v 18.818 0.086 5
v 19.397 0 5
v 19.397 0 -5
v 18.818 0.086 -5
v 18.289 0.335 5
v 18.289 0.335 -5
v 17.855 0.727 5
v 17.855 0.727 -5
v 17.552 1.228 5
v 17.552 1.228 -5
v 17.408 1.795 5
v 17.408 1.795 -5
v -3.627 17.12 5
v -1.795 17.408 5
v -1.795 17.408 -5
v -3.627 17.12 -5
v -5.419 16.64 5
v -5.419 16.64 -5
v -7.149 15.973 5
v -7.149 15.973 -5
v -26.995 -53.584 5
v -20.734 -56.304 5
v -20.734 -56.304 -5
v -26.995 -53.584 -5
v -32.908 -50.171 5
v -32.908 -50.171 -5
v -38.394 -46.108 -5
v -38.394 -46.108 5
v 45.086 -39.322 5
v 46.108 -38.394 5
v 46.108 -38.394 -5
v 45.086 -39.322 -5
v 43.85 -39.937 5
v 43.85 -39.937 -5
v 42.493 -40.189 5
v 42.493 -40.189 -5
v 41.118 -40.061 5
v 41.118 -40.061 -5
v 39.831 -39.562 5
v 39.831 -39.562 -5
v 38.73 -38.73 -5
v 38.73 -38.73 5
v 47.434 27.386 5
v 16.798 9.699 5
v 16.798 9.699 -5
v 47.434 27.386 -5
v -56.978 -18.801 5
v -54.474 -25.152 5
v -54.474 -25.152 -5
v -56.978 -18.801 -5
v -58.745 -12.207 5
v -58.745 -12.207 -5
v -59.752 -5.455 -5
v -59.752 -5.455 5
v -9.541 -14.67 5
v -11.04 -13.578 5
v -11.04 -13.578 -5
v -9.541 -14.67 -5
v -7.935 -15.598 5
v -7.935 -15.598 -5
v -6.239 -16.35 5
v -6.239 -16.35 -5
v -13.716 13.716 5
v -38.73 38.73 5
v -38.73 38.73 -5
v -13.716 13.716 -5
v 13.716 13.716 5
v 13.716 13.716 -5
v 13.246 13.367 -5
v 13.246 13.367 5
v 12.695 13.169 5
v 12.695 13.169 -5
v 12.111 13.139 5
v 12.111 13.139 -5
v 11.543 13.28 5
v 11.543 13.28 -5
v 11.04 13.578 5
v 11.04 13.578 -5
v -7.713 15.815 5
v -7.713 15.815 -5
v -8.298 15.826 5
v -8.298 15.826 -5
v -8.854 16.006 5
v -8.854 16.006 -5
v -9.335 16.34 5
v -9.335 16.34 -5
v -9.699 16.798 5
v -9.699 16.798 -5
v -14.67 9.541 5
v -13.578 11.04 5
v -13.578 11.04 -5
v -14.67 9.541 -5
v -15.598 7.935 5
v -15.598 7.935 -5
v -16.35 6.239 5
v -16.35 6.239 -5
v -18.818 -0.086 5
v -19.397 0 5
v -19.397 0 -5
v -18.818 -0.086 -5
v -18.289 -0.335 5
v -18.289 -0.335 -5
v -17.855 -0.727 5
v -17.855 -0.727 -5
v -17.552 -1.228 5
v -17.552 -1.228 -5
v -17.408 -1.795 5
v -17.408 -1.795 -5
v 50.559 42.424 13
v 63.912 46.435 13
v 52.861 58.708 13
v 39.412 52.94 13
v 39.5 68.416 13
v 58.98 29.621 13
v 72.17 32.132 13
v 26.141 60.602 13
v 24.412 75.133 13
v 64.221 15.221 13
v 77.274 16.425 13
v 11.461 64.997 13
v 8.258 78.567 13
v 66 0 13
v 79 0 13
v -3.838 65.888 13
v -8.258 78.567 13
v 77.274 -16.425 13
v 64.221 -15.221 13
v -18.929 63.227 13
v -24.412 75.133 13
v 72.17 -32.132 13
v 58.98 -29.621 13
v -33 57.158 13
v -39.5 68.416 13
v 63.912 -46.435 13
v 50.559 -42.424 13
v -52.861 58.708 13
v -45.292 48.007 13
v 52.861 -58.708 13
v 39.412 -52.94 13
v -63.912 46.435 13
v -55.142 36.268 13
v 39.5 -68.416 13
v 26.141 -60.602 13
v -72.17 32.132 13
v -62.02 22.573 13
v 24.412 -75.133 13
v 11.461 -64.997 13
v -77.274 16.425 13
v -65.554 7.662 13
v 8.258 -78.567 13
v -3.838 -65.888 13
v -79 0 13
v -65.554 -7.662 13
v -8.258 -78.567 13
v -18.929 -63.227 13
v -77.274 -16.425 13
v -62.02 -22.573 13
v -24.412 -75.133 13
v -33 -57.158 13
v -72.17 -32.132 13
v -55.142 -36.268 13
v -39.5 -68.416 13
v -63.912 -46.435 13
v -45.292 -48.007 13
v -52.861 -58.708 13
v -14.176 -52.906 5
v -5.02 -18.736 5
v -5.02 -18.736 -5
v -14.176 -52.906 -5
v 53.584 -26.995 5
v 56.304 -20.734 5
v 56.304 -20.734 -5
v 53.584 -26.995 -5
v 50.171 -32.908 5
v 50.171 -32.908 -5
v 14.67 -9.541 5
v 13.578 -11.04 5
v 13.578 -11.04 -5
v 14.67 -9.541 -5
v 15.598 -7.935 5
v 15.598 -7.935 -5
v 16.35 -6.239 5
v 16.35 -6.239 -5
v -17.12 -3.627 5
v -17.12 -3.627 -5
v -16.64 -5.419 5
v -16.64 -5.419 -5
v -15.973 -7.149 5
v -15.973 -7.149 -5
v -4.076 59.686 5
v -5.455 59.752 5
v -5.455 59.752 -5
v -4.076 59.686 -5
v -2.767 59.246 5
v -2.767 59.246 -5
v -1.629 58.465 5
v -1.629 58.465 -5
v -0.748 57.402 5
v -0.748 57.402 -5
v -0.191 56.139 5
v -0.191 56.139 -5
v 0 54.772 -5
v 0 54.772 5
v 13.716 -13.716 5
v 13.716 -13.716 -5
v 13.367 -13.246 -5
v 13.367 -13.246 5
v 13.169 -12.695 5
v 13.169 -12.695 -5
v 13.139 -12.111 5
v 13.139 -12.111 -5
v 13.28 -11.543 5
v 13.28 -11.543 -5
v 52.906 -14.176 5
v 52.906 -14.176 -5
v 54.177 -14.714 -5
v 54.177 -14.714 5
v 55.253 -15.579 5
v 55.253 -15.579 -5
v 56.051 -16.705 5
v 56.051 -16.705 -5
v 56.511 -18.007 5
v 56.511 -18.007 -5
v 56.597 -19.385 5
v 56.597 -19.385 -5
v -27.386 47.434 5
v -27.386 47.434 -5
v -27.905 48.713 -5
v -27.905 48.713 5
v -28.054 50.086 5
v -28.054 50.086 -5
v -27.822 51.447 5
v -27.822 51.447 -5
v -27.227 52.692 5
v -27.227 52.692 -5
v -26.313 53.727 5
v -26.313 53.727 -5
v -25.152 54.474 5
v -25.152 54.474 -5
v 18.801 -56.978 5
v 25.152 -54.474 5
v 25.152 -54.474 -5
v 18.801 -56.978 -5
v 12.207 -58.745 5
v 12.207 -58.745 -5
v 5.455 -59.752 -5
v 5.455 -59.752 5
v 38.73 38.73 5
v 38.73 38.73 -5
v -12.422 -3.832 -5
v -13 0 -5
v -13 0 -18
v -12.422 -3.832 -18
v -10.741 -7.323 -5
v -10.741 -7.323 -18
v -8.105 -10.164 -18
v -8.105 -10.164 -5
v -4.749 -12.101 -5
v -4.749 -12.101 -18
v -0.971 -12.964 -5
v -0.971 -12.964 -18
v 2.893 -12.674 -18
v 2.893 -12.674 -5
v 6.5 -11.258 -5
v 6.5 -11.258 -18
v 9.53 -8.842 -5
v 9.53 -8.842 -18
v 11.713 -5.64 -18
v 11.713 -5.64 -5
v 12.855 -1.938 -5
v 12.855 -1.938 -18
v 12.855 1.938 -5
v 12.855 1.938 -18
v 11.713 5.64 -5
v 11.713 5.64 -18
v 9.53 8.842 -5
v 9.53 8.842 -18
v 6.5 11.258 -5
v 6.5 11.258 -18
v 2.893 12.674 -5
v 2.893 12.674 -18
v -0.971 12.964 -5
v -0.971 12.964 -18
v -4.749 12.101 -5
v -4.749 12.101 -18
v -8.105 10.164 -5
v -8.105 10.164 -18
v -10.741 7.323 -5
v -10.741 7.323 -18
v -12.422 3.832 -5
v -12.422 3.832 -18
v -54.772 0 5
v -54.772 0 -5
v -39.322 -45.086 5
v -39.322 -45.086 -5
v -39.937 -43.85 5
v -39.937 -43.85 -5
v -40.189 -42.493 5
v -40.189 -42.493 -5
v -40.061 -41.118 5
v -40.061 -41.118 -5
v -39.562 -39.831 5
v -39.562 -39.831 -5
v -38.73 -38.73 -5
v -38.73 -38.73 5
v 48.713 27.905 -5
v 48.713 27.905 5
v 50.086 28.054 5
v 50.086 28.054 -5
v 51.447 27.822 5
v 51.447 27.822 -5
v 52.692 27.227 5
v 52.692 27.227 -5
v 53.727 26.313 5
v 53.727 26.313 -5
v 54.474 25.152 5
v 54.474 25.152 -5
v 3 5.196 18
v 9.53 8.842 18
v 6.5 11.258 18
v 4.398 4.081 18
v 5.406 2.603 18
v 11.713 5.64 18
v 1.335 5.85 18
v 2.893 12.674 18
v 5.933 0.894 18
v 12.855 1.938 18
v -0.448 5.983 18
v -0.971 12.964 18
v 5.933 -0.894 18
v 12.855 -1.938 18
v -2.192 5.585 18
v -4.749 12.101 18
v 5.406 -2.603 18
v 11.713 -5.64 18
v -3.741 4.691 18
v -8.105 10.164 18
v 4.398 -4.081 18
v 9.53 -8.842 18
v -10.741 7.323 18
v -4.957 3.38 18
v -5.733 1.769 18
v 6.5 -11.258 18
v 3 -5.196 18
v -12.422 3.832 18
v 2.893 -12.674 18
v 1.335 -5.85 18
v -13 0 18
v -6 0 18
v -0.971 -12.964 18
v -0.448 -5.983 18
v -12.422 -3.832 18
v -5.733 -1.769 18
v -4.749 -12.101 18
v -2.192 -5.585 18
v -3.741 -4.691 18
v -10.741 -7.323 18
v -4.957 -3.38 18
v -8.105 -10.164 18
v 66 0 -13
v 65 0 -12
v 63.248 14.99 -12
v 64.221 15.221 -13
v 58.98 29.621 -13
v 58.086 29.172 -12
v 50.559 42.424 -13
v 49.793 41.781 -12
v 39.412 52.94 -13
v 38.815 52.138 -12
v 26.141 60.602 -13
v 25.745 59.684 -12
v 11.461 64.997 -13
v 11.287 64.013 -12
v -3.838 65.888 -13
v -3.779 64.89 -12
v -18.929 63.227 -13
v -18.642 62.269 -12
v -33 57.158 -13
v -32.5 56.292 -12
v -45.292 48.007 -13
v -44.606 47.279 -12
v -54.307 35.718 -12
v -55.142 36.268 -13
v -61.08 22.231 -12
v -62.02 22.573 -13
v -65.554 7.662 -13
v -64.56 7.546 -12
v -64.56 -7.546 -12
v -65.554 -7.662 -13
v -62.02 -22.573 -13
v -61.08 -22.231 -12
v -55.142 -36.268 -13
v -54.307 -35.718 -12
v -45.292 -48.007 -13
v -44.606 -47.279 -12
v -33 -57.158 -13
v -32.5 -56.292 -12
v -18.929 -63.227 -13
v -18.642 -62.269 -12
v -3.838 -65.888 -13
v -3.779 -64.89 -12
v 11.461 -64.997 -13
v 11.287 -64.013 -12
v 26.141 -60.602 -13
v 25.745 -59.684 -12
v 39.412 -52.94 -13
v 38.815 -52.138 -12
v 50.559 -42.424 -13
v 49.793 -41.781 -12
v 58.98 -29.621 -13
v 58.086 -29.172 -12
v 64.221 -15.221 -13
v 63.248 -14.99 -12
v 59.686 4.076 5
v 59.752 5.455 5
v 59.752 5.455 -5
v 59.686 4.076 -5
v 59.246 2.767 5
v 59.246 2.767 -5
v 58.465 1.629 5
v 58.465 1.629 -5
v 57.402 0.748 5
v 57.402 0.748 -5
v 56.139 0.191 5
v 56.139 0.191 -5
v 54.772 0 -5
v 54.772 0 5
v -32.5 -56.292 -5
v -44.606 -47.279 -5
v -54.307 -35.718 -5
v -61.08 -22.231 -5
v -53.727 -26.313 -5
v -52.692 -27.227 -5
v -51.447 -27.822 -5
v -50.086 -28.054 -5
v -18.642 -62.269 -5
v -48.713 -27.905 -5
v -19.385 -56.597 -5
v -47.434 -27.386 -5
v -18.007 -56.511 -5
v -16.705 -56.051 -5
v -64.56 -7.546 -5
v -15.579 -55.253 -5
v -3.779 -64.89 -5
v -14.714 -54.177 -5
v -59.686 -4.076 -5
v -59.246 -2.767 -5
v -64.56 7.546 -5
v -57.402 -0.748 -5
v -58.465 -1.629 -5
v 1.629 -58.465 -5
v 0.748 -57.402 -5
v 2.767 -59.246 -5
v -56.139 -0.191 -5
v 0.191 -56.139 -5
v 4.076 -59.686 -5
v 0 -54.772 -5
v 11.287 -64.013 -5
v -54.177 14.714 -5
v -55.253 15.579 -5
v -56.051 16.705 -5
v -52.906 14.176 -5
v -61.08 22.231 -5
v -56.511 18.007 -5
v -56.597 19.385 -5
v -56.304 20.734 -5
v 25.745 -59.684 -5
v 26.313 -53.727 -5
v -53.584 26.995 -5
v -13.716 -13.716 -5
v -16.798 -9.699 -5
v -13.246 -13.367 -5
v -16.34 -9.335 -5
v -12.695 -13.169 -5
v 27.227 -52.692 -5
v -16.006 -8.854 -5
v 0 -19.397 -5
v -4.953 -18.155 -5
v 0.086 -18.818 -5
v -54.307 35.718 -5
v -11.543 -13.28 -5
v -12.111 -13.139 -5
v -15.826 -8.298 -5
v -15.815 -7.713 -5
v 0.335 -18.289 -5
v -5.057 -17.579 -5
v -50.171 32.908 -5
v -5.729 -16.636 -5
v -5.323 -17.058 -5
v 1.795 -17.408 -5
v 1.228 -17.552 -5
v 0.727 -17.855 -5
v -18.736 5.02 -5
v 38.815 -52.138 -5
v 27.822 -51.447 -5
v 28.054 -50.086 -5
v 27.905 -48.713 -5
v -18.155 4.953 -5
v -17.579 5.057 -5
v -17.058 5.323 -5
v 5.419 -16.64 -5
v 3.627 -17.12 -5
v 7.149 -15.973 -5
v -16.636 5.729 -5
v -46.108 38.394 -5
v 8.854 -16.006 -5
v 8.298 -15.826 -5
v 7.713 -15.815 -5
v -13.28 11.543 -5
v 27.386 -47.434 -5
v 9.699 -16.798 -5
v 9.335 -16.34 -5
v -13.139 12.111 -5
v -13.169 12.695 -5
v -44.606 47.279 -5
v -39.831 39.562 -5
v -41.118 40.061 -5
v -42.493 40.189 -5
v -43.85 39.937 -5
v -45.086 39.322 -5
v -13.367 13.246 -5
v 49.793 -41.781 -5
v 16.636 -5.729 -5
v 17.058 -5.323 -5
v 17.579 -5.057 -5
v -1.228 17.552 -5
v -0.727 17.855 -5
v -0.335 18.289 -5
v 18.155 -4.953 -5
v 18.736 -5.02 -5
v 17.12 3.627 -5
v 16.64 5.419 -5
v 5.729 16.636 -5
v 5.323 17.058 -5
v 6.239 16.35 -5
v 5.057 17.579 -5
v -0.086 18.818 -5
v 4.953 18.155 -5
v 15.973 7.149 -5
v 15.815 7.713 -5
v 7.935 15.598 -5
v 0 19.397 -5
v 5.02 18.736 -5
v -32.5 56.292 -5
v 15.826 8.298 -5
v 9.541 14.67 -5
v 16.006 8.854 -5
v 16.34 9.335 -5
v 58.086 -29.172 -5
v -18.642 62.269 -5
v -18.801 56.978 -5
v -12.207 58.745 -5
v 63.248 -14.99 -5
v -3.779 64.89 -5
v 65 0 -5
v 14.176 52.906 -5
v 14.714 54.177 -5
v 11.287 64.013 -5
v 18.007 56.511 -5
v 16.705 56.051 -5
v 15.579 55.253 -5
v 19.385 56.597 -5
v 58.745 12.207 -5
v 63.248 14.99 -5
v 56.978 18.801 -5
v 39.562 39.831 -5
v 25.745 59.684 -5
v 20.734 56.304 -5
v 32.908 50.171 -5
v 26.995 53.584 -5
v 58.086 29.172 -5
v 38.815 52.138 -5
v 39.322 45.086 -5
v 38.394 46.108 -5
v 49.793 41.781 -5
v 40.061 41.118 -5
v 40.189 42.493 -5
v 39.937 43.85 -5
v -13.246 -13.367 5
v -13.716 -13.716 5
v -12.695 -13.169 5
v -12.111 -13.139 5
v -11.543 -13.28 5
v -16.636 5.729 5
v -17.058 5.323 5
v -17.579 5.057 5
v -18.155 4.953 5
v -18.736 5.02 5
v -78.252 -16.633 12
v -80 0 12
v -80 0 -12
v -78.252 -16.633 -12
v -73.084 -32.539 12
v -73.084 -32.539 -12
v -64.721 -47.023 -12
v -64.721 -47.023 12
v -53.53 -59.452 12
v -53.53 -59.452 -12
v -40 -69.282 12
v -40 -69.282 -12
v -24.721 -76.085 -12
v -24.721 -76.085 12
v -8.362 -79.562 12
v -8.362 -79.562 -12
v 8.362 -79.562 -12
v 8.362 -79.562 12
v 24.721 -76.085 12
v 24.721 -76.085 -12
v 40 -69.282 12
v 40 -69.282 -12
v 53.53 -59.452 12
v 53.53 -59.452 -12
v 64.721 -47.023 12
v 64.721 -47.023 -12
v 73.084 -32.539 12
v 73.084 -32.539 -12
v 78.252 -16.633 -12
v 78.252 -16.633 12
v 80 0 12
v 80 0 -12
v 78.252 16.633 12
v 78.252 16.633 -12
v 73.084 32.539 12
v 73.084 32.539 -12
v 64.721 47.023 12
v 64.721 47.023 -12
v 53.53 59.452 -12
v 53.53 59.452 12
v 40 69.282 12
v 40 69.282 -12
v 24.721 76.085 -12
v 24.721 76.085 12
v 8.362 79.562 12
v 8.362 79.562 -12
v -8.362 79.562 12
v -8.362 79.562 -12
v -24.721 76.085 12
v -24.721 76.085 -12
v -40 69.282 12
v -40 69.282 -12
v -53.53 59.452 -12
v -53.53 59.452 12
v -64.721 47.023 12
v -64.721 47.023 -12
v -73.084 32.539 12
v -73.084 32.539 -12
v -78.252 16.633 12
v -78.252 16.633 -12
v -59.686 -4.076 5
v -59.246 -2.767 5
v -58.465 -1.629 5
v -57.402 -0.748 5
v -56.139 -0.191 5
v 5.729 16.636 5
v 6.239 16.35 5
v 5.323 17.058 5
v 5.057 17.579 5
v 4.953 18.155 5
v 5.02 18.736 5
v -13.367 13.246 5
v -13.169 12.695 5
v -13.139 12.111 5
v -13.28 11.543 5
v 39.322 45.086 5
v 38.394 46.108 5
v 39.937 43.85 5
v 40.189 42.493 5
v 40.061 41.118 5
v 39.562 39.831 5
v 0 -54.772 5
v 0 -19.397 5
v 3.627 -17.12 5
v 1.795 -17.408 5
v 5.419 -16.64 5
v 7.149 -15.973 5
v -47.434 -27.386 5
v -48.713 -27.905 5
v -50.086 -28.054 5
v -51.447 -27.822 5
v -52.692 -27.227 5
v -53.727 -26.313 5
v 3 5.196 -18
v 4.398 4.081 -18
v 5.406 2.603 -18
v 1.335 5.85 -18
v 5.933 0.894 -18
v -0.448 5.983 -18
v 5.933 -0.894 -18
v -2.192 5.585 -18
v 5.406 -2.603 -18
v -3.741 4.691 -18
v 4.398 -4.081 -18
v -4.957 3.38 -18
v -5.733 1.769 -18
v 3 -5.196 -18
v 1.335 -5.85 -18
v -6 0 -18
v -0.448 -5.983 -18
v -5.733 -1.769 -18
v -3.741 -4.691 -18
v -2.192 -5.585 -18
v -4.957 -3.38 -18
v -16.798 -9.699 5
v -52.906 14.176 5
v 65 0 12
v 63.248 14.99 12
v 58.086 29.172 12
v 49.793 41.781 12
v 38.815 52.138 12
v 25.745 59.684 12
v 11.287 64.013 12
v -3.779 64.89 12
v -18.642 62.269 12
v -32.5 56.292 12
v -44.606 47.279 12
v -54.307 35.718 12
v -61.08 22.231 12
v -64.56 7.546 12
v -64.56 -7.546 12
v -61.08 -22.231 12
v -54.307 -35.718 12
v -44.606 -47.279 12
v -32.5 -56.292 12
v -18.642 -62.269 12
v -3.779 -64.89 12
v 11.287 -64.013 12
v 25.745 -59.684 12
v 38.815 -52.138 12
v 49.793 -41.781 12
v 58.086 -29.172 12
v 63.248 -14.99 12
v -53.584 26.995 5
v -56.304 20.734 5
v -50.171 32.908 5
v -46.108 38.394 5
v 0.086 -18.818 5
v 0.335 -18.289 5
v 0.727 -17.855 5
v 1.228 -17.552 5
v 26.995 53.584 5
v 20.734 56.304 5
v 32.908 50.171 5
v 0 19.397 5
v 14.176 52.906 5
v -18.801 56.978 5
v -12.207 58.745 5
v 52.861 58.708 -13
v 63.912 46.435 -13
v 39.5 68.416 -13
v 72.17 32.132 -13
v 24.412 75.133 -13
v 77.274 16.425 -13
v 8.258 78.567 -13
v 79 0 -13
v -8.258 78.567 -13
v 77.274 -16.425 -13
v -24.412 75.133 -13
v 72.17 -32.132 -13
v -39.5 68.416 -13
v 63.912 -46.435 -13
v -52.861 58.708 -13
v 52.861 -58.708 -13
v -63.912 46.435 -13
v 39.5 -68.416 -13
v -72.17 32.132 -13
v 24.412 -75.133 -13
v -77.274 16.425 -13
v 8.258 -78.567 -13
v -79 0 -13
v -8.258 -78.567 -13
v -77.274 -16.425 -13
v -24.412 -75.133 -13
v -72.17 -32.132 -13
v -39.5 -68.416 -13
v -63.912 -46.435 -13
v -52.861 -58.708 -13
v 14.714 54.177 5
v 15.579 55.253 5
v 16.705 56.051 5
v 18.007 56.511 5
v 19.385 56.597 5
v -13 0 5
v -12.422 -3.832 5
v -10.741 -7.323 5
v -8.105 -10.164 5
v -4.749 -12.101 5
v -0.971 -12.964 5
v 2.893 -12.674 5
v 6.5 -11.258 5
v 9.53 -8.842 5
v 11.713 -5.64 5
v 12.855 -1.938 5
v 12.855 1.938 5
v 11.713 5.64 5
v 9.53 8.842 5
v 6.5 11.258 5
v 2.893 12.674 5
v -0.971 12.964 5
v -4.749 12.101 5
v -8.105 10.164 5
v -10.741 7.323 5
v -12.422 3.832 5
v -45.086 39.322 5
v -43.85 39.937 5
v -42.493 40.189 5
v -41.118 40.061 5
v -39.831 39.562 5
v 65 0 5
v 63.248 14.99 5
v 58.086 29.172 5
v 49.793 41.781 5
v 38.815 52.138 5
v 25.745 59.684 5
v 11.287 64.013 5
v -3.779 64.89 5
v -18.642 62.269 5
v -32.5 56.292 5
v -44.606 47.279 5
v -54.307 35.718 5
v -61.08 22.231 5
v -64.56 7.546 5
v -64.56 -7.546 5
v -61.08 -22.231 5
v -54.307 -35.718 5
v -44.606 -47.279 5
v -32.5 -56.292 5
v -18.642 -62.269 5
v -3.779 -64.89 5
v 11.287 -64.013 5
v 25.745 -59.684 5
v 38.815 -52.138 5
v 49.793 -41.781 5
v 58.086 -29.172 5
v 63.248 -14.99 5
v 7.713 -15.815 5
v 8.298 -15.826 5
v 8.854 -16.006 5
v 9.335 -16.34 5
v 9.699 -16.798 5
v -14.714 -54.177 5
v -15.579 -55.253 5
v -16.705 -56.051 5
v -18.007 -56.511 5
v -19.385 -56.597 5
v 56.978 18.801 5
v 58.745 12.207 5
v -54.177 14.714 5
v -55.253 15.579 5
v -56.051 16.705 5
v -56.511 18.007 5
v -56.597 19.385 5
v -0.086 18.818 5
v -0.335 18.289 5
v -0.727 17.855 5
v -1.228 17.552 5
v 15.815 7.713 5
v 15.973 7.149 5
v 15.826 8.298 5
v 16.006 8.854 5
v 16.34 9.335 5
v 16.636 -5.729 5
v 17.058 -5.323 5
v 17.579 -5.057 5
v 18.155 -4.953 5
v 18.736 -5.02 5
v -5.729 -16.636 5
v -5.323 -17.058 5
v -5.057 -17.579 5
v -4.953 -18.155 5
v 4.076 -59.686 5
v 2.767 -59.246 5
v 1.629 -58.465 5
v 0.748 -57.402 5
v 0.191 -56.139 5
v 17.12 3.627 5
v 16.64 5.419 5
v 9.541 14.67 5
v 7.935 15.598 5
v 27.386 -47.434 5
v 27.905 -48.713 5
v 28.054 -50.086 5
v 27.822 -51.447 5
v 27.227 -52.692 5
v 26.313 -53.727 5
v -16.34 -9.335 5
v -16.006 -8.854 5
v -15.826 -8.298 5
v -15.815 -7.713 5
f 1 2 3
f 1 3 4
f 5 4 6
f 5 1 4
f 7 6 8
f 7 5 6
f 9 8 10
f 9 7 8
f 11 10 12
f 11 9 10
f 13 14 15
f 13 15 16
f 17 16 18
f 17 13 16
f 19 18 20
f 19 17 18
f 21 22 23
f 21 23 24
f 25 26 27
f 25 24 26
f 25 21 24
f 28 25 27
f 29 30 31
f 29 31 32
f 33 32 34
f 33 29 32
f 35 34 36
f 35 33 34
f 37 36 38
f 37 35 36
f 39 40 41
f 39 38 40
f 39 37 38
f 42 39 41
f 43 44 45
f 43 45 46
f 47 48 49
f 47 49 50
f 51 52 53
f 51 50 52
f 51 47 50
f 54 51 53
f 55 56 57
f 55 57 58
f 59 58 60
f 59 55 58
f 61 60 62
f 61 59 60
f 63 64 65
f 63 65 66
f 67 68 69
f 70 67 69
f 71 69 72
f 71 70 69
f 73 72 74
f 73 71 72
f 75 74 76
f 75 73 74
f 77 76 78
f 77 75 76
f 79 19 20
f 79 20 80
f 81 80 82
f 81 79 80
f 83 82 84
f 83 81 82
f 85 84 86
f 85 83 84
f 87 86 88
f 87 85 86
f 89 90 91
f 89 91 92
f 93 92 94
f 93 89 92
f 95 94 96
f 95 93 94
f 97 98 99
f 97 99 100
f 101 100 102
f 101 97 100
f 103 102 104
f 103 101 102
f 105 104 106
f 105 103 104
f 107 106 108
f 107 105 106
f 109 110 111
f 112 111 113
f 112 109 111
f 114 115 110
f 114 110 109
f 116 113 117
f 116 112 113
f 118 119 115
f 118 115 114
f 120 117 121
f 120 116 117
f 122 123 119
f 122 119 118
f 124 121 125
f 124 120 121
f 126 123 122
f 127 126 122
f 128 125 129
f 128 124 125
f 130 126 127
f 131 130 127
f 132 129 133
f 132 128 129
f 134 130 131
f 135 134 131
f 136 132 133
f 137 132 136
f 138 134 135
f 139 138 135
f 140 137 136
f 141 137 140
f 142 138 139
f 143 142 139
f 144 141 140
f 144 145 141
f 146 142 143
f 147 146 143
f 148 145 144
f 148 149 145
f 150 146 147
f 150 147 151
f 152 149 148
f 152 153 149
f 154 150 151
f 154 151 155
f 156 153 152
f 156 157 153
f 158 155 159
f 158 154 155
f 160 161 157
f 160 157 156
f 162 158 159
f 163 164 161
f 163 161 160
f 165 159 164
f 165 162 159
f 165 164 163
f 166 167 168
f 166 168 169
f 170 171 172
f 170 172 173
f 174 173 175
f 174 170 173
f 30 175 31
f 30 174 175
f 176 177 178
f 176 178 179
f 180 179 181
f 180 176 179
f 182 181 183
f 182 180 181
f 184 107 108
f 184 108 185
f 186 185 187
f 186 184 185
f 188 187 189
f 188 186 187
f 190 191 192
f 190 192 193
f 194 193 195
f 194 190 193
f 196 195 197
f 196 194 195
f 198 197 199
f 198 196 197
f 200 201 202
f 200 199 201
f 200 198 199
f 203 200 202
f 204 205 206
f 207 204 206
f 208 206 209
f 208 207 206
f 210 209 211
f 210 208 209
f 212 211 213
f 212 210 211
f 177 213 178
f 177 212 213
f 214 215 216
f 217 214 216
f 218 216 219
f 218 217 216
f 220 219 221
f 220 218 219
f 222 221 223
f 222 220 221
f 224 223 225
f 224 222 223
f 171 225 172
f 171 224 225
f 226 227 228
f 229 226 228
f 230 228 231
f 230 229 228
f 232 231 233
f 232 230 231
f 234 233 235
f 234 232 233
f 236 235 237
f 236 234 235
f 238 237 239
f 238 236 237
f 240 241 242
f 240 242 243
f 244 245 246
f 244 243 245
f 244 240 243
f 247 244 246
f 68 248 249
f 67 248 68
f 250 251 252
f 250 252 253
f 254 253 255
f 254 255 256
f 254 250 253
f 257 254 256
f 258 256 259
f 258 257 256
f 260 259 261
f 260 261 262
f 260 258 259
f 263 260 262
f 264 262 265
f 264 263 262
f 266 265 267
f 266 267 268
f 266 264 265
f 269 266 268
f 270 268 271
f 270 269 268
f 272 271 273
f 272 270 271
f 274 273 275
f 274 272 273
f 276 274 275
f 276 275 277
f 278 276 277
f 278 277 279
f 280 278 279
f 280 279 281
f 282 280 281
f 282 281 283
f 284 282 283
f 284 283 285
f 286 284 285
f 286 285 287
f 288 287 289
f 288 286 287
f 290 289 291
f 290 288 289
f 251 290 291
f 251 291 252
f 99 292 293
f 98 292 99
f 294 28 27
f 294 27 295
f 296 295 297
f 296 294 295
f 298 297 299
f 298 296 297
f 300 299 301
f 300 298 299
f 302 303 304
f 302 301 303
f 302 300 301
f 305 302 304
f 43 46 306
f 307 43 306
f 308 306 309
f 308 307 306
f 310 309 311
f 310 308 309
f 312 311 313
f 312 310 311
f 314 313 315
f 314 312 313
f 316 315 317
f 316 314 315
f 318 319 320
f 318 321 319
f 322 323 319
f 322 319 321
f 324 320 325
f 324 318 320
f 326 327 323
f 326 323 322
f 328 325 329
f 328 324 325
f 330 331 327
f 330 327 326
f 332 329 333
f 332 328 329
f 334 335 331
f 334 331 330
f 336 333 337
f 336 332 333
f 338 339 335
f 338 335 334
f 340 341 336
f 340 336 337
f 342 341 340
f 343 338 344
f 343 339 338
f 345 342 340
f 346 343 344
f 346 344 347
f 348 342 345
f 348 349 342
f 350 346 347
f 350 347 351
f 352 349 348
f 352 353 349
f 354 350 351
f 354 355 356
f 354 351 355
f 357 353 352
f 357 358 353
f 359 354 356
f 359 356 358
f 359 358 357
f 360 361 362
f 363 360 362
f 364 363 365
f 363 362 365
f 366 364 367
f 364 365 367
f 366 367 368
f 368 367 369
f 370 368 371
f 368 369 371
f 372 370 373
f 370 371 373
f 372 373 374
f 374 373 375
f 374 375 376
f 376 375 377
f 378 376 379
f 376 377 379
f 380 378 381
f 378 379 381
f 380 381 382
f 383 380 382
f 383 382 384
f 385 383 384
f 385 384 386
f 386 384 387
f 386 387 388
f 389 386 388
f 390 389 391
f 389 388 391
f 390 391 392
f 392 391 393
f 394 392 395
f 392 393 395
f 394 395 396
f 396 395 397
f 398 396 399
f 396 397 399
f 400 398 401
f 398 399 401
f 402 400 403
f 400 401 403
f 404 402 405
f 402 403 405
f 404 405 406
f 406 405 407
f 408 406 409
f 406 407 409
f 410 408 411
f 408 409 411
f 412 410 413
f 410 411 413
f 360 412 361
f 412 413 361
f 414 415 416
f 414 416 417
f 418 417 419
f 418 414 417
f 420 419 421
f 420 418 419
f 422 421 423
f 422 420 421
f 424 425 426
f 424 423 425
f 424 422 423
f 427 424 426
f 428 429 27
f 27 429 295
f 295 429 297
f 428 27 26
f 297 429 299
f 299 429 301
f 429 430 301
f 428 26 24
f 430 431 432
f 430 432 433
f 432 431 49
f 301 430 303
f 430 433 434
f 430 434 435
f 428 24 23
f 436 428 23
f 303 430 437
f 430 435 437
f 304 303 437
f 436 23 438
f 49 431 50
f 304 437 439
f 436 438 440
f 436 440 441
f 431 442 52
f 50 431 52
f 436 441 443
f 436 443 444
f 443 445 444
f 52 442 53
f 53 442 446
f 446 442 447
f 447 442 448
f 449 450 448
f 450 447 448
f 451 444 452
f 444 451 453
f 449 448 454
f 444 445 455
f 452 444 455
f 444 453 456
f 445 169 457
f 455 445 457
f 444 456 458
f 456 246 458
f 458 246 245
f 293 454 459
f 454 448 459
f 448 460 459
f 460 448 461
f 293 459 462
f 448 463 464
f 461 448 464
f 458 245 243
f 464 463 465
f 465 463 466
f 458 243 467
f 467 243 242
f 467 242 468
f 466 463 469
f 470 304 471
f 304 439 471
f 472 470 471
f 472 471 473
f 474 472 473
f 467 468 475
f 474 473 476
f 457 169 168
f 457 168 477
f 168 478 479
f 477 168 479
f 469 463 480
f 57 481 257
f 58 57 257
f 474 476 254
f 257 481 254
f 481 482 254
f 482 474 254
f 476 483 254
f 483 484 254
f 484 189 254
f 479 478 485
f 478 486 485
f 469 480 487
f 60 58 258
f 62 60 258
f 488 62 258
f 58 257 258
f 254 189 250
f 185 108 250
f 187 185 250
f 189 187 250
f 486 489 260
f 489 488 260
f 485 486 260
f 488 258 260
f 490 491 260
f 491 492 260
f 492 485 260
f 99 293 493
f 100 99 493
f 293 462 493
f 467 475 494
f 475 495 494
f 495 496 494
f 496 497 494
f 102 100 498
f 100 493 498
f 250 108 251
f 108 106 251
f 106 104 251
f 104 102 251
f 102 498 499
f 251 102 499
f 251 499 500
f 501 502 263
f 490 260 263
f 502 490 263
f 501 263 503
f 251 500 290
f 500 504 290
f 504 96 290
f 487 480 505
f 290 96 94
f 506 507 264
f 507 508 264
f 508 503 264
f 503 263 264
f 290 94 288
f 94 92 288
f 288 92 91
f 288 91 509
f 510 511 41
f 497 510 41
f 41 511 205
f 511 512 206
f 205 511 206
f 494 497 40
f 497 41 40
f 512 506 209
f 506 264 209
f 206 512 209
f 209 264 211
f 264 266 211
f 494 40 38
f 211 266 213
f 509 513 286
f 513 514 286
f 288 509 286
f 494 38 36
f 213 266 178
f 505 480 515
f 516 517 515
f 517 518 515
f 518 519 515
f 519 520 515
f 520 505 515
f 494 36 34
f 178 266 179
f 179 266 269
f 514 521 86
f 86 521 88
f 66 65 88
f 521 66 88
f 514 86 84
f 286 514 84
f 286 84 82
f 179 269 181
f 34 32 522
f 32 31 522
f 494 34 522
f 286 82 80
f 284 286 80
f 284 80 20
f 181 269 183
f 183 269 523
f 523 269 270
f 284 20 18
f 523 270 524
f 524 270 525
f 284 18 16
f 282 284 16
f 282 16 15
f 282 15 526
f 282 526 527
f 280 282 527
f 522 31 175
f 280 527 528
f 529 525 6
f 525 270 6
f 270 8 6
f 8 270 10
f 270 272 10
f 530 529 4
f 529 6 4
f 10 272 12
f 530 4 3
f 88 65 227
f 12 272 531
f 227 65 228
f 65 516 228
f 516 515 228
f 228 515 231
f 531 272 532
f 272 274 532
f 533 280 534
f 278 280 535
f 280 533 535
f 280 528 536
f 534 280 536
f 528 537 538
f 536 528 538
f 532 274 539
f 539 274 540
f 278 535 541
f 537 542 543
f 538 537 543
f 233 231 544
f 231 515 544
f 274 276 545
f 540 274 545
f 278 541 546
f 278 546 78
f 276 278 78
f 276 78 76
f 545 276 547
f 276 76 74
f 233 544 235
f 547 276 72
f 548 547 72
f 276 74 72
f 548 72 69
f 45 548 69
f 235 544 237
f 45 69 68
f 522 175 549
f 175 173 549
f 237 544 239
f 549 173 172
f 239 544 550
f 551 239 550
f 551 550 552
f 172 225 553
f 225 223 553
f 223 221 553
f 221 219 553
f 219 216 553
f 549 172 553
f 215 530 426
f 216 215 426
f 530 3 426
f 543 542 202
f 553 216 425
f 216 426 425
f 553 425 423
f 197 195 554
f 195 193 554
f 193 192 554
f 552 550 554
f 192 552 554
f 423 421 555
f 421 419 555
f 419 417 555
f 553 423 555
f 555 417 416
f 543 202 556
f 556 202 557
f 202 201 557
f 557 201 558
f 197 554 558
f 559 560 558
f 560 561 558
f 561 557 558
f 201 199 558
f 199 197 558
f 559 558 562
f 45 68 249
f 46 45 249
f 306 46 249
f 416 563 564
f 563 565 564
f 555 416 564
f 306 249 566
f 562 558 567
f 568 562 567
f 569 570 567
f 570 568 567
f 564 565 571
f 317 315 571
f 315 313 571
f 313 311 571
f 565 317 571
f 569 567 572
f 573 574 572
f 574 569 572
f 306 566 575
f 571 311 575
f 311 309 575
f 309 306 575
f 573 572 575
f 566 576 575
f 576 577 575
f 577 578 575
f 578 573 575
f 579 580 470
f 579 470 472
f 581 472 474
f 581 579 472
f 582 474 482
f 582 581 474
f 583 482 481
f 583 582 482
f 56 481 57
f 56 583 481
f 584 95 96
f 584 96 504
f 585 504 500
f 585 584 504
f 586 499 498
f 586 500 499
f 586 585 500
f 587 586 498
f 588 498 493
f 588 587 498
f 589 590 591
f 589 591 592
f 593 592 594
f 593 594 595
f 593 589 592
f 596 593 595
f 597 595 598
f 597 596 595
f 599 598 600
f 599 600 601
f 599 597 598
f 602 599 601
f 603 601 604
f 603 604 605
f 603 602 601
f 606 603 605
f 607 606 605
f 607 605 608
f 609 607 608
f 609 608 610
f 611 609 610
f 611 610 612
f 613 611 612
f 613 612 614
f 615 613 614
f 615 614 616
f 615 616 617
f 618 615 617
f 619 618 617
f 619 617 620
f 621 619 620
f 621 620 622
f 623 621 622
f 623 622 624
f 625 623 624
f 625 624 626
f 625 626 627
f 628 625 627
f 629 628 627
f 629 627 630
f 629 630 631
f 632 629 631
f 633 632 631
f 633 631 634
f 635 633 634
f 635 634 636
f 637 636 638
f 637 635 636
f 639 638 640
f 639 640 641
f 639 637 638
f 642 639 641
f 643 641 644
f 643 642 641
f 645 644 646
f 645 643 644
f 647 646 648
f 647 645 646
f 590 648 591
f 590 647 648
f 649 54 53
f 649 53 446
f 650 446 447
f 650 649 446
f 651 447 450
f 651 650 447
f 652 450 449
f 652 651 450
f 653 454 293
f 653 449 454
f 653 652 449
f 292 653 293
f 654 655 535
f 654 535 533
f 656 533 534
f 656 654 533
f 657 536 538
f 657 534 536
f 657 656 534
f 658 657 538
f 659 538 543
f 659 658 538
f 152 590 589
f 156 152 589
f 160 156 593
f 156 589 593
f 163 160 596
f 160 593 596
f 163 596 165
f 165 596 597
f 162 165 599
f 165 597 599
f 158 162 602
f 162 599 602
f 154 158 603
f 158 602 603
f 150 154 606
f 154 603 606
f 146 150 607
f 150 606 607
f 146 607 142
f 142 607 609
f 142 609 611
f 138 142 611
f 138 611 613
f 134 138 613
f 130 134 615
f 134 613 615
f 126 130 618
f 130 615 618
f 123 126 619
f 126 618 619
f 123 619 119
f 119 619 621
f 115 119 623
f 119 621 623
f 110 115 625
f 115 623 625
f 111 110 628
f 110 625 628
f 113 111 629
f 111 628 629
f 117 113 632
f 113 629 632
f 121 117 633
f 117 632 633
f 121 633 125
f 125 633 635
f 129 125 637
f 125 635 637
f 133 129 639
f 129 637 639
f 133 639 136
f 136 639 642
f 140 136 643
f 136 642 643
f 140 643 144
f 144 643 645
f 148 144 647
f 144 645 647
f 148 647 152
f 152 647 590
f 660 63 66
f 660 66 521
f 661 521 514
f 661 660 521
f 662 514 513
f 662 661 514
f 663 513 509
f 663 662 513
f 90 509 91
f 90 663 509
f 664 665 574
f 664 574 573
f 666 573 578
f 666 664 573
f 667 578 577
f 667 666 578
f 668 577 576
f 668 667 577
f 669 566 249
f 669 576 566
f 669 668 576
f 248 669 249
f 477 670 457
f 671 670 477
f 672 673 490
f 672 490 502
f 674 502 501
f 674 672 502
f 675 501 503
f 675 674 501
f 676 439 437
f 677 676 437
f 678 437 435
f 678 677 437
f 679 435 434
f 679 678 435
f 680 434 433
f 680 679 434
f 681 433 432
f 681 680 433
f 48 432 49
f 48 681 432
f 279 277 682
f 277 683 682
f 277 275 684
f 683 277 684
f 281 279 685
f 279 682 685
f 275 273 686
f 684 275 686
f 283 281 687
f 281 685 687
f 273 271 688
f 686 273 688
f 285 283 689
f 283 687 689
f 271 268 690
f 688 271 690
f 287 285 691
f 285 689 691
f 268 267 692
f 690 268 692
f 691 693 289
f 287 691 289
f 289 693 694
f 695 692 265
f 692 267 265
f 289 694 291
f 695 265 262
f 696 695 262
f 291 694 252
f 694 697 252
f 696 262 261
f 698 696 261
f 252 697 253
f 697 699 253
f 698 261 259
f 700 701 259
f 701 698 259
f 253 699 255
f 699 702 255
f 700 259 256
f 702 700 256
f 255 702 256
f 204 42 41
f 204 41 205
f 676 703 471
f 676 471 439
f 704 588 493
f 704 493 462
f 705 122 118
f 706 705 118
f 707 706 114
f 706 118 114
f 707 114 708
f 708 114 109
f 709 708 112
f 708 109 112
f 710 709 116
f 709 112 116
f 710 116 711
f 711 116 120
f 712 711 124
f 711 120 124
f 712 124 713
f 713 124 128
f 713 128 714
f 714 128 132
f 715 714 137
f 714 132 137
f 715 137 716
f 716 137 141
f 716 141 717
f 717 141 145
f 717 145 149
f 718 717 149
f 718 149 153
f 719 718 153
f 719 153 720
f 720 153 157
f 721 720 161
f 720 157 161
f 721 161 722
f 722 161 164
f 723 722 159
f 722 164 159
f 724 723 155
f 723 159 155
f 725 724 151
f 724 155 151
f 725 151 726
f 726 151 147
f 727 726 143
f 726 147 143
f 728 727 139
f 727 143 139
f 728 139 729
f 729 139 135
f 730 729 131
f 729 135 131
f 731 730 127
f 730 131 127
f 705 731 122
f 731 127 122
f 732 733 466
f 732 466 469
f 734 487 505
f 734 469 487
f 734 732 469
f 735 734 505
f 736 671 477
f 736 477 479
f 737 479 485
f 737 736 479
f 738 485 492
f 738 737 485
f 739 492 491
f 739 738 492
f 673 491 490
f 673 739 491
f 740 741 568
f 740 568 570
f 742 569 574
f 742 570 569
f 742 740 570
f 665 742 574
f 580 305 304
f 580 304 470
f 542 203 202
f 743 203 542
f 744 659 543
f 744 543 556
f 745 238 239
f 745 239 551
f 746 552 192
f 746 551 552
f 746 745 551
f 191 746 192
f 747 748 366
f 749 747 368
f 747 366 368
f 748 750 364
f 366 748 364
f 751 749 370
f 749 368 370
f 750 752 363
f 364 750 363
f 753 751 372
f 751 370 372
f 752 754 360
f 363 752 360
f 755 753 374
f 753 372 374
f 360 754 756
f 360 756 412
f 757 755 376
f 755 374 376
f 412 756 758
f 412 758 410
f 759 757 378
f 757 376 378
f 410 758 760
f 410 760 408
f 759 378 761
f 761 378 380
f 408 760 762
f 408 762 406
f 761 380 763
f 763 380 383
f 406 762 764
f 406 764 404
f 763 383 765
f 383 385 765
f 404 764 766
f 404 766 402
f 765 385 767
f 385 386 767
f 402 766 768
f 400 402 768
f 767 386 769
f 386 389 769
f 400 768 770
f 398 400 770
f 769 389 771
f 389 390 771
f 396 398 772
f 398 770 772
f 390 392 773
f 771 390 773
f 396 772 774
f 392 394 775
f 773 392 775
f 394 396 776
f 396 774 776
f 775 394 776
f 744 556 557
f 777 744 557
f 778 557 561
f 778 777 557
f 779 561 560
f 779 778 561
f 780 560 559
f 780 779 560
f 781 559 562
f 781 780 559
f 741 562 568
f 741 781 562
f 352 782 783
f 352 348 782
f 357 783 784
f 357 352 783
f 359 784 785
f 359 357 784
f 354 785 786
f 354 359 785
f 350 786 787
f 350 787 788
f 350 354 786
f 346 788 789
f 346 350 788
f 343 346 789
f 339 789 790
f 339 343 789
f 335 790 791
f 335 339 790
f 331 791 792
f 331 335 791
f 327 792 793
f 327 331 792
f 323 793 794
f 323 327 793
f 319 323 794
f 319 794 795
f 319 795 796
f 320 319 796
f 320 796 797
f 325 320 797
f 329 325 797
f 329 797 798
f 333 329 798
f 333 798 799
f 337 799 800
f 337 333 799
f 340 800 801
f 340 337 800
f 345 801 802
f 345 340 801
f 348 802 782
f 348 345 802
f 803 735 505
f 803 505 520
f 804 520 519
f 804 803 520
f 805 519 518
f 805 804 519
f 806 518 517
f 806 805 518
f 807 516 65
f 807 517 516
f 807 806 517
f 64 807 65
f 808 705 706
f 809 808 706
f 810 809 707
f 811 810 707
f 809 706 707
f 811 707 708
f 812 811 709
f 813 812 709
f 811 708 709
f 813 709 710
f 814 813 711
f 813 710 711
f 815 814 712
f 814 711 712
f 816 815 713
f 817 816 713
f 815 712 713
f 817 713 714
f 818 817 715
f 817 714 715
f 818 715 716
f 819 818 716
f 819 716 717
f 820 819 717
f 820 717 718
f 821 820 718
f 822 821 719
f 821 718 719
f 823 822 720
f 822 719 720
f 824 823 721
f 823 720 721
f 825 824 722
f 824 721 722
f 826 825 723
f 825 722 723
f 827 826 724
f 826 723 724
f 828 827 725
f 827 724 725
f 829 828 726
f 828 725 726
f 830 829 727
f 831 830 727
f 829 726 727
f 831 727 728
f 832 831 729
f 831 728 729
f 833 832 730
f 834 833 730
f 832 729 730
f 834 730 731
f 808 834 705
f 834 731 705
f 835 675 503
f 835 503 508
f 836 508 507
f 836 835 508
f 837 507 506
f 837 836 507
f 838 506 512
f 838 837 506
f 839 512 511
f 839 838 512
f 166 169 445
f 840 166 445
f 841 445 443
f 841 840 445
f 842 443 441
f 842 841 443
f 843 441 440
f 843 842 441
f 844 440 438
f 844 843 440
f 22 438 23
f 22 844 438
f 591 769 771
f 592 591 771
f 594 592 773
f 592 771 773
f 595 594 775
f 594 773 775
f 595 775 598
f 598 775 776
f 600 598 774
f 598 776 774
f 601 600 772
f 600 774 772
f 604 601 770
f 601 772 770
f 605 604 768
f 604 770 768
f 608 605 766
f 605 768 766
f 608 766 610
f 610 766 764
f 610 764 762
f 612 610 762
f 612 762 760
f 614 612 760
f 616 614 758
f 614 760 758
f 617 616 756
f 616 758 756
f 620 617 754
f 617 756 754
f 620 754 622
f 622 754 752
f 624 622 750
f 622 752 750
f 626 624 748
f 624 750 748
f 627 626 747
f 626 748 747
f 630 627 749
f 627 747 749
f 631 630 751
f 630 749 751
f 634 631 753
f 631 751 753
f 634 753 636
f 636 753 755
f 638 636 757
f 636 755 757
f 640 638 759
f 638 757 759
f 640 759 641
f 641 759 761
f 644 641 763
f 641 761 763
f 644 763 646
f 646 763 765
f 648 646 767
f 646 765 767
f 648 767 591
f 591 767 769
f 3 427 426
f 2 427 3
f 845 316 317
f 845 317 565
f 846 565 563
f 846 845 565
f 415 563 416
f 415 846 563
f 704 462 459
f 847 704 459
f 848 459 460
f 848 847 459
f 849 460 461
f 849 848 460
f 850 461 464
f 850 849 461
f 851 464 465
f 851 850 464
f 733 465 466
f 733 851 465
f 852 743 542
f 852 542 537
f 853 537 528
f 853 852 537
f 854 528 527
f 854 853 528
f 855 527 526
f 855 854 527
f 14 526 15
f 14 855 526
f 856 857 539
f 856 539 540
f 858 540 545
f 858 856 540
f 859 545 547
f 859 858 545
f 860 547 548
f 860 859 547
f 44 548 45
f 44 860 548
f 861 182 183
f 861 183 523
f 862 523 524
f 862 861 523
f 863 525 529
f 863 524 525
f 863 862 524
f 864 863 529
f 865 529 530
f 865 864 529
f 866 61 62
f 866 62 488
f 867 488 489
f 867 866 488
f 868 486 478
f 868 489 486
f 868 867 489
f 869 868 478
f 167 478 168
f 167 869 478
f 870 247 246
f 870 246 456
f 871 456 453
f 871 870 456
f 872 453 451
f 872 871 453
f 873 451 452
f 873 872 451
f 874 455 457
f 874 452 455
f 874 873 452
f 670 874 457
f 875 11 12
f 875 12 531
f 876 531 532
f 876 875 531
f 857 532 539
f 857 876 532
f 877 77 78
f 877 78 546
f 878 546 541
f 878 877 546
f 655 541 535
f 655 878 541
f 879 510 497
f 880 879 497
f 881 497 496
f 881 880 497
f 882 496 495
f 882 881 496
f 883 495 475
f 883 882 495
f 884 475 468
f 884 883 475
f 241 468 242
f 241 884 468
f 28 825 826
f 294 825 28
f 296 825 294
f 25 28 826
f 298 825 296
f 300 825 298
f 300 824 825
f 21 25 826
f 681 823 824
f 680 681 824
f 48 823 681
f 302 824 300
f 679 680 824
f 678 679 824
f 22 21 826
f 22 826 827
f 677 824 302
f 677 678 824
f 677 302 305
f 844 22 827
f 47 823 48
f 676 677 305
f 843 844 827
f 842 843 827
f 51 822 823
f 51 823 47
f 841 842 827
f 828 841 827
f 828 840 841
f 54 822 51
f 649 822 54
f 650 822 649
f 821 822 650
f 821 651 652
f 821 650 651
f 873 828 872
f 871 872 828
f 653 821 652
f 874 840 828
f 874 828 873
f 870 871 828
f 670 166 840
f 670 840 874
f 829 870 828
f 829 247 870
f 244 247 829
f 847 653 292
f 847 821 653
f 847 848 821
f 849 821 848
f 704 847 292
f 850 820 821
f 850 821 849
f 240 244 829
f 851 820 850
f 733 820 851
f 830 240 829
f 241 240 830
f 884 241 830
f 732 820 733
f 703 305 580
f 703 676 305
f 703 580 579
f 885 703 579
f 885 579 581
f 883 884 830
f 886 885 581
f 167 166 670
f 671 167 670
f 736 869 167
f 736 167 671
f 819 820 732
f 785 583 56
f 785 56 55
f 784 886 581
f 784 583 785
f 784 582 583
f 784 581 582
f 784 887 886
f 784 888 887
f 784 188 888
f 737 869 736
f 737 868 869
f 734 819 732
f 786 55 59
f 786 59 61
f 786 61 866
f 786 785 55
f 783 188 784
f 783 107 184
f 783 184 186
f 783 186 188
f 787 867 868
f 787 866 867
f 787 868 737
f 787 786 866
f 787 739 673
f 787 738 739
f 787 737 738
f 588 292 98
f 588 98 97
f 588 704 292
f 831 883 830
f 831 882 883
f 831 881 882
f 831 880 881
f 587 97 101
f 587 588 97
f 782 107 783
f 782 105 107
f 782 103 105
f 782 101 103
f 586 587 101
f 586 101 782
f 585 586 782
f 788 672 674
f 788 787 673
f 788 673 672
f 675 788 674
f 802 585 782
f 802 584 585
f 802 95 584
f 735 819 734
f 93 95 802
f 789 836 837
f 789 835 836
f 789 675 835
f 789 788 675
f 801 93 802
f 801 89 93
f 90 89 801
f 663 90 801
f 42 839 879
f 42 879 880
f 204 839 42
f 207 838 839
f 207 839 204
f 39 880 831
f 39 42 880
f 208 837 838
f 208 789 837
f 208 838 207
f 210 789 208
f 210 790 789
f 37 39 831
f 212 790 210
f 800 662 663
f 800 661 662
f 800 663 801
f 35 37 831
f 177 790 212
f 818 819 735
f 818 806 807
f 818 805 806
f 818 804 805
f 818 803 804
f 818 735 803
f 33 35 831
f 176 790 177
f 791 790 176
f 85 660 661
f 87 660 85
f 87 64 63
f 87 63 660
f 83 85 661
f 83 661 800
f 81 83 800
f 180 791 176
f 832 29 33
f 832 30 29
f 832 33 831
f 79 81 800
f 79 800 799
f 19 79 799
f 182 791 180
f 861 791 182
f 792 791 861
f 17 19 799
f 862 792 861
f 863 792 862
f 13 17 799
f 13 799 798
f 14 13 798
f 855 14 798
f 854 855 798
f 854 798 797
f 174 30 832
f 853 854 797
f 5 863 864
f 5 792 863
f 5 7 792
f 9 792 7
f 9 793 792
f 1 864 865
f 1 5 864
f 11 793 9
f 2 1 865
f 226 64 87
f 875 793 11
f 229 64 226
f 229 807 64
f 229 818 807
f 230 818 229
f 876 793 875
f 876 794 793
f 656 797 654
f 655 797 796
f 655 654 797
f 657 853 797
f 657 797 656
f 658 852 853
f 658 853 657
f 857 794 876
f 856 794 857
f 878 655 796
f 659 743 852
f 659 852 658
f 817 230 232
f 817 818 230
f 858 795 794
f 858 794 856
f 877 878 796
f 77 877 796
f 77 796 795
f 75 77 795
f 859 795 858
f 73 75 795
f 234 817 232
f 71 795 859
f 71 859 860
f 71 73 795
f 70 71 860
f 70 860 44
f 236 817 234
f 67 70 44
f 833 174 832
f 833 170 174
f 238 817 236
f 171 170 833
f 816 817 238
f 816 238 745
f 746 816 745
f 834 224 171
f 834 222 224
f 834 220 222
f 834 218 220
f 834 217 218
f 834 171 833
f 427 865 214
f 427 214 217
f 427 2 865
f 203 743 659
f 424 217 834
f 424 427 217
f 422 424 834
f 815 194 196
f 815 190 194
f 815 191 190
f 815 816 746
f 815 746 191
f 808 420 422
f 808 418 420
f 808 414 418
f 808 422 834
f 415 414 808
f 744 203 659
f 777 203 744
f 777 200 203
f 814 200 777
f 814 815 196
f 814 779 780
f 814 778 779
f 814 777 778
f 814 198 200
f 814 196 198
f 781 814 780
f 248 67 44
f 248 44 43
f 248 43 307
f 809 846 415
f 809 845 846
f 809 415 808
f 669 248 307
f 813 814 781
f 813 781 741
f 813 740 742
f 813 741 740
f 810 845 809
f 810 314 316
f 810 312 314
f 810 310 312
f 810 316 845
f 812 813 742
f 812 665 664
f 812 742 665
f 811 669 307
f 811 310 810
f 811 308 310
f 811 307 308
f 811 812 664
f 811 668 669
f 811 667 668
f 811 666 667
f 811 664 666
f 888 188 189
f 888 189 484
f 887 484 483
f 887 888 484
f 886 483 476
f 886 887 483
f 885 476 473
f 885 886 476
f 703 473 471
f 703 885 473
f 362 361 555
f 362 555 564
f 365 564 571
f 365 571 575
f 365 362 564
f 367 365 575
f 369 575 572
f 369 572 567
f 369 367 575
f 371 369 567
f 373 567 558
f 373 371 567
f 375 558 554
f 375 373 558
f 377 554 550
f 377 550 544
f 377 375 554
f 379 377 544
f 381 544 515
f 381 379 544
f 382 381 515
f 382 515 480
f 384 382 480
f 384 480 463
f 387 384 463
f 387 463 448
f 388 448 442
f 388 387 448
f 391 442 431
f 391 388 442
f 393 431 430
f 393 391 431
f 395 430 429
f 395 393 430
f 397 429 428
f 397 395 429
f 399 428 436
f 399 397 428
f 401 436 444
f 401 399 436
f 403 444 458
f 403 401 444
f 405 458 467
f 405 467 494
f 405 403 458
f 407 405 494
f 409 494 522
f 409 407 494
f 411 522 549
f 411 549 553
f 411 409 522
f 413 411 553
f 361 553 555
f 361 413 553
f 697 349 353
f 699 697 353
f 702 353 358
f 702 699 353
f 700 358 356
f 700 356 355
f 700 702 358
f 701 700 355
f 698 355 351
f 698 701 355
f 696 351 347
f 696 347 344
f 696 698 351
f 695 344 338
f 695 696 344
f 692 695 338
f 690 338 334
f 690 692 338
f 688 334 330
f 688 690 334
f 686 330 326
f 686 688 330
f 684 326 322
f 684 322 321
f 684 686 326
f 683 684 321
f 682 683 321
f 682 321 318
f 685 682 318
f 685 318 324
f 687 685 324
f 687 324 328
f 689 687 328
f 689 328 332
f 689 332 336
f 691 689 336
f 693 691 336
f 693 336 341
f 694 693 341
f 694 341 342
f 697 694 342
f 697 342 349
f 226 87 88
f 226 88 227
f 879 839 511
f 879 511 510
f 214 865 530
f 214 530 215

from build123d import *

# Parameters (mm, degrees)
SKETCH1_R           = 80
SKETCH1_R_2         = 6
BOSS_EXTRUDE1_DEPTH = 13
SKETCH2_R           = 65
CUT_EXTRUDE1_DEPTH  = 8
SKETCH5_R           = 13
SKETCH5_R_2         = 6
BOSS_EXTRUDE2_DEPTH = 18
CHAMFER1_SIZE       = 1
CUT_EXTRUDE2_DEPTH  = 116.451288429
CIRPATTERN1_COUNT   = 8


with BuildPart() as part:
    # Sketch1 → Boss-Extrude1 (new, symmetric)
    with BuildSketch(Plane.XY):
        with Locations(Location((0, 0, 0), (0, 0, 180))):
            Circle(SKETCH1_R)
        with Locations(Location((0, 0, 0), (0, 0, 180))):
            Circle(SKETCH1_R_2, mode=Mode.SUBTRACT)
    extrude(amount=BOSS_EXTRUDE1_DEPTH, both=True)

    # Sketch2 → Cut-Extrude1 (cut)
    with BuildSketch(Plane.XY.offset(13)):
        Circle(SKETCH2_R)
    cut_extrude1 = extrude(amount=-CUT_EXTRUDE1_DEPTH, mode=Mode.SUBTRACT)

    # Mirror1: Cut-Extrude1 across plane
    add(cut_extrude1.mirror(Plane.XY), mode=Mode.SUBTRACT)

    # Sketch5 → Boss-Extrude2 (add, symmetric)
    with BuildSketch(Plane.XY):
        with Locations(Location((0, 0, 0), (0, 0, 180))):
            Circle(SKETCH5_R)
        with Locations(Location((0, 0, 0), (0, 0, 180))):
            Circle(SKETCH5_R_2, mode=Mode.SUBTRACT)
    extrude(amount=BOSS_EXTRUDE2_DEPTH, both=True)

    # Chamfer1
    chamfer1_edges = [part.edges().sort_by_distance(p)[0] for p in [
        (-65, 0, 13),
        (-65, 0, -13),
        (80, 0, -13),
        (80, 0, 13),
    ]]
    chamfer(chamfer1_edges, length=CHAMFER1_SIZE)

    # Sketch7 → Cut-Extrude2 (cut, symmetric)
    with BuildSketch(Plane.XY.offset(5)):
        with BuildLine():
            Line((0, 54.772255751), (0, 19.397164741))
            ThreePointArc((0, 19.397164741), (-0.515032591, 18.057436487), (-1.794871795, 17.407711947))
            ThreePointArc((-1.794871795, 17.407711947), (-4.529333289, 16.90370196), (-7.149451403, 15.972956666))
            ThreePointArc((-7.149451403, 15.972956666), (-8.582686936, 15.895715021), (-9.698582371, 16.798437427))
            Line((-9.698582371, 16.798437427), (-27.386127875, 47.434164903))
            ThreePointArc((-27.386127875, 47.434164903), (-27.821744262, 51.446675992), (-25.152000934, 54.473634439))
            ThreePointArc((-25.152000934, 54.473634439), (-15.529142706, 57.955549577), (-5.454545455, 59.751551728))
            ThreePointArc((-5.454545455, 59.751551728), (-1.629000688, 58.46500048), (0, 54.772255751))
        make_face()
    cut_extrude2 = extrude(amount=CUT_EXTRUDE2_DEPTH, both=True, mode=Mode.SUBTRACT)

    # CirPattern1: Cut-Extrude2 ×8 about axis
    cirpattern1_axis = Axis((0, 0, 0), (0, 0, 1))
    for i in range(1, CIRPATTERN1_COUNT):
        add(cut_extrude2.rotate(cirpattern1_axis, i * 360 / CIRPATTERN1_COUNT), mode=Mode.SUBTRACT)


solid = part.part
